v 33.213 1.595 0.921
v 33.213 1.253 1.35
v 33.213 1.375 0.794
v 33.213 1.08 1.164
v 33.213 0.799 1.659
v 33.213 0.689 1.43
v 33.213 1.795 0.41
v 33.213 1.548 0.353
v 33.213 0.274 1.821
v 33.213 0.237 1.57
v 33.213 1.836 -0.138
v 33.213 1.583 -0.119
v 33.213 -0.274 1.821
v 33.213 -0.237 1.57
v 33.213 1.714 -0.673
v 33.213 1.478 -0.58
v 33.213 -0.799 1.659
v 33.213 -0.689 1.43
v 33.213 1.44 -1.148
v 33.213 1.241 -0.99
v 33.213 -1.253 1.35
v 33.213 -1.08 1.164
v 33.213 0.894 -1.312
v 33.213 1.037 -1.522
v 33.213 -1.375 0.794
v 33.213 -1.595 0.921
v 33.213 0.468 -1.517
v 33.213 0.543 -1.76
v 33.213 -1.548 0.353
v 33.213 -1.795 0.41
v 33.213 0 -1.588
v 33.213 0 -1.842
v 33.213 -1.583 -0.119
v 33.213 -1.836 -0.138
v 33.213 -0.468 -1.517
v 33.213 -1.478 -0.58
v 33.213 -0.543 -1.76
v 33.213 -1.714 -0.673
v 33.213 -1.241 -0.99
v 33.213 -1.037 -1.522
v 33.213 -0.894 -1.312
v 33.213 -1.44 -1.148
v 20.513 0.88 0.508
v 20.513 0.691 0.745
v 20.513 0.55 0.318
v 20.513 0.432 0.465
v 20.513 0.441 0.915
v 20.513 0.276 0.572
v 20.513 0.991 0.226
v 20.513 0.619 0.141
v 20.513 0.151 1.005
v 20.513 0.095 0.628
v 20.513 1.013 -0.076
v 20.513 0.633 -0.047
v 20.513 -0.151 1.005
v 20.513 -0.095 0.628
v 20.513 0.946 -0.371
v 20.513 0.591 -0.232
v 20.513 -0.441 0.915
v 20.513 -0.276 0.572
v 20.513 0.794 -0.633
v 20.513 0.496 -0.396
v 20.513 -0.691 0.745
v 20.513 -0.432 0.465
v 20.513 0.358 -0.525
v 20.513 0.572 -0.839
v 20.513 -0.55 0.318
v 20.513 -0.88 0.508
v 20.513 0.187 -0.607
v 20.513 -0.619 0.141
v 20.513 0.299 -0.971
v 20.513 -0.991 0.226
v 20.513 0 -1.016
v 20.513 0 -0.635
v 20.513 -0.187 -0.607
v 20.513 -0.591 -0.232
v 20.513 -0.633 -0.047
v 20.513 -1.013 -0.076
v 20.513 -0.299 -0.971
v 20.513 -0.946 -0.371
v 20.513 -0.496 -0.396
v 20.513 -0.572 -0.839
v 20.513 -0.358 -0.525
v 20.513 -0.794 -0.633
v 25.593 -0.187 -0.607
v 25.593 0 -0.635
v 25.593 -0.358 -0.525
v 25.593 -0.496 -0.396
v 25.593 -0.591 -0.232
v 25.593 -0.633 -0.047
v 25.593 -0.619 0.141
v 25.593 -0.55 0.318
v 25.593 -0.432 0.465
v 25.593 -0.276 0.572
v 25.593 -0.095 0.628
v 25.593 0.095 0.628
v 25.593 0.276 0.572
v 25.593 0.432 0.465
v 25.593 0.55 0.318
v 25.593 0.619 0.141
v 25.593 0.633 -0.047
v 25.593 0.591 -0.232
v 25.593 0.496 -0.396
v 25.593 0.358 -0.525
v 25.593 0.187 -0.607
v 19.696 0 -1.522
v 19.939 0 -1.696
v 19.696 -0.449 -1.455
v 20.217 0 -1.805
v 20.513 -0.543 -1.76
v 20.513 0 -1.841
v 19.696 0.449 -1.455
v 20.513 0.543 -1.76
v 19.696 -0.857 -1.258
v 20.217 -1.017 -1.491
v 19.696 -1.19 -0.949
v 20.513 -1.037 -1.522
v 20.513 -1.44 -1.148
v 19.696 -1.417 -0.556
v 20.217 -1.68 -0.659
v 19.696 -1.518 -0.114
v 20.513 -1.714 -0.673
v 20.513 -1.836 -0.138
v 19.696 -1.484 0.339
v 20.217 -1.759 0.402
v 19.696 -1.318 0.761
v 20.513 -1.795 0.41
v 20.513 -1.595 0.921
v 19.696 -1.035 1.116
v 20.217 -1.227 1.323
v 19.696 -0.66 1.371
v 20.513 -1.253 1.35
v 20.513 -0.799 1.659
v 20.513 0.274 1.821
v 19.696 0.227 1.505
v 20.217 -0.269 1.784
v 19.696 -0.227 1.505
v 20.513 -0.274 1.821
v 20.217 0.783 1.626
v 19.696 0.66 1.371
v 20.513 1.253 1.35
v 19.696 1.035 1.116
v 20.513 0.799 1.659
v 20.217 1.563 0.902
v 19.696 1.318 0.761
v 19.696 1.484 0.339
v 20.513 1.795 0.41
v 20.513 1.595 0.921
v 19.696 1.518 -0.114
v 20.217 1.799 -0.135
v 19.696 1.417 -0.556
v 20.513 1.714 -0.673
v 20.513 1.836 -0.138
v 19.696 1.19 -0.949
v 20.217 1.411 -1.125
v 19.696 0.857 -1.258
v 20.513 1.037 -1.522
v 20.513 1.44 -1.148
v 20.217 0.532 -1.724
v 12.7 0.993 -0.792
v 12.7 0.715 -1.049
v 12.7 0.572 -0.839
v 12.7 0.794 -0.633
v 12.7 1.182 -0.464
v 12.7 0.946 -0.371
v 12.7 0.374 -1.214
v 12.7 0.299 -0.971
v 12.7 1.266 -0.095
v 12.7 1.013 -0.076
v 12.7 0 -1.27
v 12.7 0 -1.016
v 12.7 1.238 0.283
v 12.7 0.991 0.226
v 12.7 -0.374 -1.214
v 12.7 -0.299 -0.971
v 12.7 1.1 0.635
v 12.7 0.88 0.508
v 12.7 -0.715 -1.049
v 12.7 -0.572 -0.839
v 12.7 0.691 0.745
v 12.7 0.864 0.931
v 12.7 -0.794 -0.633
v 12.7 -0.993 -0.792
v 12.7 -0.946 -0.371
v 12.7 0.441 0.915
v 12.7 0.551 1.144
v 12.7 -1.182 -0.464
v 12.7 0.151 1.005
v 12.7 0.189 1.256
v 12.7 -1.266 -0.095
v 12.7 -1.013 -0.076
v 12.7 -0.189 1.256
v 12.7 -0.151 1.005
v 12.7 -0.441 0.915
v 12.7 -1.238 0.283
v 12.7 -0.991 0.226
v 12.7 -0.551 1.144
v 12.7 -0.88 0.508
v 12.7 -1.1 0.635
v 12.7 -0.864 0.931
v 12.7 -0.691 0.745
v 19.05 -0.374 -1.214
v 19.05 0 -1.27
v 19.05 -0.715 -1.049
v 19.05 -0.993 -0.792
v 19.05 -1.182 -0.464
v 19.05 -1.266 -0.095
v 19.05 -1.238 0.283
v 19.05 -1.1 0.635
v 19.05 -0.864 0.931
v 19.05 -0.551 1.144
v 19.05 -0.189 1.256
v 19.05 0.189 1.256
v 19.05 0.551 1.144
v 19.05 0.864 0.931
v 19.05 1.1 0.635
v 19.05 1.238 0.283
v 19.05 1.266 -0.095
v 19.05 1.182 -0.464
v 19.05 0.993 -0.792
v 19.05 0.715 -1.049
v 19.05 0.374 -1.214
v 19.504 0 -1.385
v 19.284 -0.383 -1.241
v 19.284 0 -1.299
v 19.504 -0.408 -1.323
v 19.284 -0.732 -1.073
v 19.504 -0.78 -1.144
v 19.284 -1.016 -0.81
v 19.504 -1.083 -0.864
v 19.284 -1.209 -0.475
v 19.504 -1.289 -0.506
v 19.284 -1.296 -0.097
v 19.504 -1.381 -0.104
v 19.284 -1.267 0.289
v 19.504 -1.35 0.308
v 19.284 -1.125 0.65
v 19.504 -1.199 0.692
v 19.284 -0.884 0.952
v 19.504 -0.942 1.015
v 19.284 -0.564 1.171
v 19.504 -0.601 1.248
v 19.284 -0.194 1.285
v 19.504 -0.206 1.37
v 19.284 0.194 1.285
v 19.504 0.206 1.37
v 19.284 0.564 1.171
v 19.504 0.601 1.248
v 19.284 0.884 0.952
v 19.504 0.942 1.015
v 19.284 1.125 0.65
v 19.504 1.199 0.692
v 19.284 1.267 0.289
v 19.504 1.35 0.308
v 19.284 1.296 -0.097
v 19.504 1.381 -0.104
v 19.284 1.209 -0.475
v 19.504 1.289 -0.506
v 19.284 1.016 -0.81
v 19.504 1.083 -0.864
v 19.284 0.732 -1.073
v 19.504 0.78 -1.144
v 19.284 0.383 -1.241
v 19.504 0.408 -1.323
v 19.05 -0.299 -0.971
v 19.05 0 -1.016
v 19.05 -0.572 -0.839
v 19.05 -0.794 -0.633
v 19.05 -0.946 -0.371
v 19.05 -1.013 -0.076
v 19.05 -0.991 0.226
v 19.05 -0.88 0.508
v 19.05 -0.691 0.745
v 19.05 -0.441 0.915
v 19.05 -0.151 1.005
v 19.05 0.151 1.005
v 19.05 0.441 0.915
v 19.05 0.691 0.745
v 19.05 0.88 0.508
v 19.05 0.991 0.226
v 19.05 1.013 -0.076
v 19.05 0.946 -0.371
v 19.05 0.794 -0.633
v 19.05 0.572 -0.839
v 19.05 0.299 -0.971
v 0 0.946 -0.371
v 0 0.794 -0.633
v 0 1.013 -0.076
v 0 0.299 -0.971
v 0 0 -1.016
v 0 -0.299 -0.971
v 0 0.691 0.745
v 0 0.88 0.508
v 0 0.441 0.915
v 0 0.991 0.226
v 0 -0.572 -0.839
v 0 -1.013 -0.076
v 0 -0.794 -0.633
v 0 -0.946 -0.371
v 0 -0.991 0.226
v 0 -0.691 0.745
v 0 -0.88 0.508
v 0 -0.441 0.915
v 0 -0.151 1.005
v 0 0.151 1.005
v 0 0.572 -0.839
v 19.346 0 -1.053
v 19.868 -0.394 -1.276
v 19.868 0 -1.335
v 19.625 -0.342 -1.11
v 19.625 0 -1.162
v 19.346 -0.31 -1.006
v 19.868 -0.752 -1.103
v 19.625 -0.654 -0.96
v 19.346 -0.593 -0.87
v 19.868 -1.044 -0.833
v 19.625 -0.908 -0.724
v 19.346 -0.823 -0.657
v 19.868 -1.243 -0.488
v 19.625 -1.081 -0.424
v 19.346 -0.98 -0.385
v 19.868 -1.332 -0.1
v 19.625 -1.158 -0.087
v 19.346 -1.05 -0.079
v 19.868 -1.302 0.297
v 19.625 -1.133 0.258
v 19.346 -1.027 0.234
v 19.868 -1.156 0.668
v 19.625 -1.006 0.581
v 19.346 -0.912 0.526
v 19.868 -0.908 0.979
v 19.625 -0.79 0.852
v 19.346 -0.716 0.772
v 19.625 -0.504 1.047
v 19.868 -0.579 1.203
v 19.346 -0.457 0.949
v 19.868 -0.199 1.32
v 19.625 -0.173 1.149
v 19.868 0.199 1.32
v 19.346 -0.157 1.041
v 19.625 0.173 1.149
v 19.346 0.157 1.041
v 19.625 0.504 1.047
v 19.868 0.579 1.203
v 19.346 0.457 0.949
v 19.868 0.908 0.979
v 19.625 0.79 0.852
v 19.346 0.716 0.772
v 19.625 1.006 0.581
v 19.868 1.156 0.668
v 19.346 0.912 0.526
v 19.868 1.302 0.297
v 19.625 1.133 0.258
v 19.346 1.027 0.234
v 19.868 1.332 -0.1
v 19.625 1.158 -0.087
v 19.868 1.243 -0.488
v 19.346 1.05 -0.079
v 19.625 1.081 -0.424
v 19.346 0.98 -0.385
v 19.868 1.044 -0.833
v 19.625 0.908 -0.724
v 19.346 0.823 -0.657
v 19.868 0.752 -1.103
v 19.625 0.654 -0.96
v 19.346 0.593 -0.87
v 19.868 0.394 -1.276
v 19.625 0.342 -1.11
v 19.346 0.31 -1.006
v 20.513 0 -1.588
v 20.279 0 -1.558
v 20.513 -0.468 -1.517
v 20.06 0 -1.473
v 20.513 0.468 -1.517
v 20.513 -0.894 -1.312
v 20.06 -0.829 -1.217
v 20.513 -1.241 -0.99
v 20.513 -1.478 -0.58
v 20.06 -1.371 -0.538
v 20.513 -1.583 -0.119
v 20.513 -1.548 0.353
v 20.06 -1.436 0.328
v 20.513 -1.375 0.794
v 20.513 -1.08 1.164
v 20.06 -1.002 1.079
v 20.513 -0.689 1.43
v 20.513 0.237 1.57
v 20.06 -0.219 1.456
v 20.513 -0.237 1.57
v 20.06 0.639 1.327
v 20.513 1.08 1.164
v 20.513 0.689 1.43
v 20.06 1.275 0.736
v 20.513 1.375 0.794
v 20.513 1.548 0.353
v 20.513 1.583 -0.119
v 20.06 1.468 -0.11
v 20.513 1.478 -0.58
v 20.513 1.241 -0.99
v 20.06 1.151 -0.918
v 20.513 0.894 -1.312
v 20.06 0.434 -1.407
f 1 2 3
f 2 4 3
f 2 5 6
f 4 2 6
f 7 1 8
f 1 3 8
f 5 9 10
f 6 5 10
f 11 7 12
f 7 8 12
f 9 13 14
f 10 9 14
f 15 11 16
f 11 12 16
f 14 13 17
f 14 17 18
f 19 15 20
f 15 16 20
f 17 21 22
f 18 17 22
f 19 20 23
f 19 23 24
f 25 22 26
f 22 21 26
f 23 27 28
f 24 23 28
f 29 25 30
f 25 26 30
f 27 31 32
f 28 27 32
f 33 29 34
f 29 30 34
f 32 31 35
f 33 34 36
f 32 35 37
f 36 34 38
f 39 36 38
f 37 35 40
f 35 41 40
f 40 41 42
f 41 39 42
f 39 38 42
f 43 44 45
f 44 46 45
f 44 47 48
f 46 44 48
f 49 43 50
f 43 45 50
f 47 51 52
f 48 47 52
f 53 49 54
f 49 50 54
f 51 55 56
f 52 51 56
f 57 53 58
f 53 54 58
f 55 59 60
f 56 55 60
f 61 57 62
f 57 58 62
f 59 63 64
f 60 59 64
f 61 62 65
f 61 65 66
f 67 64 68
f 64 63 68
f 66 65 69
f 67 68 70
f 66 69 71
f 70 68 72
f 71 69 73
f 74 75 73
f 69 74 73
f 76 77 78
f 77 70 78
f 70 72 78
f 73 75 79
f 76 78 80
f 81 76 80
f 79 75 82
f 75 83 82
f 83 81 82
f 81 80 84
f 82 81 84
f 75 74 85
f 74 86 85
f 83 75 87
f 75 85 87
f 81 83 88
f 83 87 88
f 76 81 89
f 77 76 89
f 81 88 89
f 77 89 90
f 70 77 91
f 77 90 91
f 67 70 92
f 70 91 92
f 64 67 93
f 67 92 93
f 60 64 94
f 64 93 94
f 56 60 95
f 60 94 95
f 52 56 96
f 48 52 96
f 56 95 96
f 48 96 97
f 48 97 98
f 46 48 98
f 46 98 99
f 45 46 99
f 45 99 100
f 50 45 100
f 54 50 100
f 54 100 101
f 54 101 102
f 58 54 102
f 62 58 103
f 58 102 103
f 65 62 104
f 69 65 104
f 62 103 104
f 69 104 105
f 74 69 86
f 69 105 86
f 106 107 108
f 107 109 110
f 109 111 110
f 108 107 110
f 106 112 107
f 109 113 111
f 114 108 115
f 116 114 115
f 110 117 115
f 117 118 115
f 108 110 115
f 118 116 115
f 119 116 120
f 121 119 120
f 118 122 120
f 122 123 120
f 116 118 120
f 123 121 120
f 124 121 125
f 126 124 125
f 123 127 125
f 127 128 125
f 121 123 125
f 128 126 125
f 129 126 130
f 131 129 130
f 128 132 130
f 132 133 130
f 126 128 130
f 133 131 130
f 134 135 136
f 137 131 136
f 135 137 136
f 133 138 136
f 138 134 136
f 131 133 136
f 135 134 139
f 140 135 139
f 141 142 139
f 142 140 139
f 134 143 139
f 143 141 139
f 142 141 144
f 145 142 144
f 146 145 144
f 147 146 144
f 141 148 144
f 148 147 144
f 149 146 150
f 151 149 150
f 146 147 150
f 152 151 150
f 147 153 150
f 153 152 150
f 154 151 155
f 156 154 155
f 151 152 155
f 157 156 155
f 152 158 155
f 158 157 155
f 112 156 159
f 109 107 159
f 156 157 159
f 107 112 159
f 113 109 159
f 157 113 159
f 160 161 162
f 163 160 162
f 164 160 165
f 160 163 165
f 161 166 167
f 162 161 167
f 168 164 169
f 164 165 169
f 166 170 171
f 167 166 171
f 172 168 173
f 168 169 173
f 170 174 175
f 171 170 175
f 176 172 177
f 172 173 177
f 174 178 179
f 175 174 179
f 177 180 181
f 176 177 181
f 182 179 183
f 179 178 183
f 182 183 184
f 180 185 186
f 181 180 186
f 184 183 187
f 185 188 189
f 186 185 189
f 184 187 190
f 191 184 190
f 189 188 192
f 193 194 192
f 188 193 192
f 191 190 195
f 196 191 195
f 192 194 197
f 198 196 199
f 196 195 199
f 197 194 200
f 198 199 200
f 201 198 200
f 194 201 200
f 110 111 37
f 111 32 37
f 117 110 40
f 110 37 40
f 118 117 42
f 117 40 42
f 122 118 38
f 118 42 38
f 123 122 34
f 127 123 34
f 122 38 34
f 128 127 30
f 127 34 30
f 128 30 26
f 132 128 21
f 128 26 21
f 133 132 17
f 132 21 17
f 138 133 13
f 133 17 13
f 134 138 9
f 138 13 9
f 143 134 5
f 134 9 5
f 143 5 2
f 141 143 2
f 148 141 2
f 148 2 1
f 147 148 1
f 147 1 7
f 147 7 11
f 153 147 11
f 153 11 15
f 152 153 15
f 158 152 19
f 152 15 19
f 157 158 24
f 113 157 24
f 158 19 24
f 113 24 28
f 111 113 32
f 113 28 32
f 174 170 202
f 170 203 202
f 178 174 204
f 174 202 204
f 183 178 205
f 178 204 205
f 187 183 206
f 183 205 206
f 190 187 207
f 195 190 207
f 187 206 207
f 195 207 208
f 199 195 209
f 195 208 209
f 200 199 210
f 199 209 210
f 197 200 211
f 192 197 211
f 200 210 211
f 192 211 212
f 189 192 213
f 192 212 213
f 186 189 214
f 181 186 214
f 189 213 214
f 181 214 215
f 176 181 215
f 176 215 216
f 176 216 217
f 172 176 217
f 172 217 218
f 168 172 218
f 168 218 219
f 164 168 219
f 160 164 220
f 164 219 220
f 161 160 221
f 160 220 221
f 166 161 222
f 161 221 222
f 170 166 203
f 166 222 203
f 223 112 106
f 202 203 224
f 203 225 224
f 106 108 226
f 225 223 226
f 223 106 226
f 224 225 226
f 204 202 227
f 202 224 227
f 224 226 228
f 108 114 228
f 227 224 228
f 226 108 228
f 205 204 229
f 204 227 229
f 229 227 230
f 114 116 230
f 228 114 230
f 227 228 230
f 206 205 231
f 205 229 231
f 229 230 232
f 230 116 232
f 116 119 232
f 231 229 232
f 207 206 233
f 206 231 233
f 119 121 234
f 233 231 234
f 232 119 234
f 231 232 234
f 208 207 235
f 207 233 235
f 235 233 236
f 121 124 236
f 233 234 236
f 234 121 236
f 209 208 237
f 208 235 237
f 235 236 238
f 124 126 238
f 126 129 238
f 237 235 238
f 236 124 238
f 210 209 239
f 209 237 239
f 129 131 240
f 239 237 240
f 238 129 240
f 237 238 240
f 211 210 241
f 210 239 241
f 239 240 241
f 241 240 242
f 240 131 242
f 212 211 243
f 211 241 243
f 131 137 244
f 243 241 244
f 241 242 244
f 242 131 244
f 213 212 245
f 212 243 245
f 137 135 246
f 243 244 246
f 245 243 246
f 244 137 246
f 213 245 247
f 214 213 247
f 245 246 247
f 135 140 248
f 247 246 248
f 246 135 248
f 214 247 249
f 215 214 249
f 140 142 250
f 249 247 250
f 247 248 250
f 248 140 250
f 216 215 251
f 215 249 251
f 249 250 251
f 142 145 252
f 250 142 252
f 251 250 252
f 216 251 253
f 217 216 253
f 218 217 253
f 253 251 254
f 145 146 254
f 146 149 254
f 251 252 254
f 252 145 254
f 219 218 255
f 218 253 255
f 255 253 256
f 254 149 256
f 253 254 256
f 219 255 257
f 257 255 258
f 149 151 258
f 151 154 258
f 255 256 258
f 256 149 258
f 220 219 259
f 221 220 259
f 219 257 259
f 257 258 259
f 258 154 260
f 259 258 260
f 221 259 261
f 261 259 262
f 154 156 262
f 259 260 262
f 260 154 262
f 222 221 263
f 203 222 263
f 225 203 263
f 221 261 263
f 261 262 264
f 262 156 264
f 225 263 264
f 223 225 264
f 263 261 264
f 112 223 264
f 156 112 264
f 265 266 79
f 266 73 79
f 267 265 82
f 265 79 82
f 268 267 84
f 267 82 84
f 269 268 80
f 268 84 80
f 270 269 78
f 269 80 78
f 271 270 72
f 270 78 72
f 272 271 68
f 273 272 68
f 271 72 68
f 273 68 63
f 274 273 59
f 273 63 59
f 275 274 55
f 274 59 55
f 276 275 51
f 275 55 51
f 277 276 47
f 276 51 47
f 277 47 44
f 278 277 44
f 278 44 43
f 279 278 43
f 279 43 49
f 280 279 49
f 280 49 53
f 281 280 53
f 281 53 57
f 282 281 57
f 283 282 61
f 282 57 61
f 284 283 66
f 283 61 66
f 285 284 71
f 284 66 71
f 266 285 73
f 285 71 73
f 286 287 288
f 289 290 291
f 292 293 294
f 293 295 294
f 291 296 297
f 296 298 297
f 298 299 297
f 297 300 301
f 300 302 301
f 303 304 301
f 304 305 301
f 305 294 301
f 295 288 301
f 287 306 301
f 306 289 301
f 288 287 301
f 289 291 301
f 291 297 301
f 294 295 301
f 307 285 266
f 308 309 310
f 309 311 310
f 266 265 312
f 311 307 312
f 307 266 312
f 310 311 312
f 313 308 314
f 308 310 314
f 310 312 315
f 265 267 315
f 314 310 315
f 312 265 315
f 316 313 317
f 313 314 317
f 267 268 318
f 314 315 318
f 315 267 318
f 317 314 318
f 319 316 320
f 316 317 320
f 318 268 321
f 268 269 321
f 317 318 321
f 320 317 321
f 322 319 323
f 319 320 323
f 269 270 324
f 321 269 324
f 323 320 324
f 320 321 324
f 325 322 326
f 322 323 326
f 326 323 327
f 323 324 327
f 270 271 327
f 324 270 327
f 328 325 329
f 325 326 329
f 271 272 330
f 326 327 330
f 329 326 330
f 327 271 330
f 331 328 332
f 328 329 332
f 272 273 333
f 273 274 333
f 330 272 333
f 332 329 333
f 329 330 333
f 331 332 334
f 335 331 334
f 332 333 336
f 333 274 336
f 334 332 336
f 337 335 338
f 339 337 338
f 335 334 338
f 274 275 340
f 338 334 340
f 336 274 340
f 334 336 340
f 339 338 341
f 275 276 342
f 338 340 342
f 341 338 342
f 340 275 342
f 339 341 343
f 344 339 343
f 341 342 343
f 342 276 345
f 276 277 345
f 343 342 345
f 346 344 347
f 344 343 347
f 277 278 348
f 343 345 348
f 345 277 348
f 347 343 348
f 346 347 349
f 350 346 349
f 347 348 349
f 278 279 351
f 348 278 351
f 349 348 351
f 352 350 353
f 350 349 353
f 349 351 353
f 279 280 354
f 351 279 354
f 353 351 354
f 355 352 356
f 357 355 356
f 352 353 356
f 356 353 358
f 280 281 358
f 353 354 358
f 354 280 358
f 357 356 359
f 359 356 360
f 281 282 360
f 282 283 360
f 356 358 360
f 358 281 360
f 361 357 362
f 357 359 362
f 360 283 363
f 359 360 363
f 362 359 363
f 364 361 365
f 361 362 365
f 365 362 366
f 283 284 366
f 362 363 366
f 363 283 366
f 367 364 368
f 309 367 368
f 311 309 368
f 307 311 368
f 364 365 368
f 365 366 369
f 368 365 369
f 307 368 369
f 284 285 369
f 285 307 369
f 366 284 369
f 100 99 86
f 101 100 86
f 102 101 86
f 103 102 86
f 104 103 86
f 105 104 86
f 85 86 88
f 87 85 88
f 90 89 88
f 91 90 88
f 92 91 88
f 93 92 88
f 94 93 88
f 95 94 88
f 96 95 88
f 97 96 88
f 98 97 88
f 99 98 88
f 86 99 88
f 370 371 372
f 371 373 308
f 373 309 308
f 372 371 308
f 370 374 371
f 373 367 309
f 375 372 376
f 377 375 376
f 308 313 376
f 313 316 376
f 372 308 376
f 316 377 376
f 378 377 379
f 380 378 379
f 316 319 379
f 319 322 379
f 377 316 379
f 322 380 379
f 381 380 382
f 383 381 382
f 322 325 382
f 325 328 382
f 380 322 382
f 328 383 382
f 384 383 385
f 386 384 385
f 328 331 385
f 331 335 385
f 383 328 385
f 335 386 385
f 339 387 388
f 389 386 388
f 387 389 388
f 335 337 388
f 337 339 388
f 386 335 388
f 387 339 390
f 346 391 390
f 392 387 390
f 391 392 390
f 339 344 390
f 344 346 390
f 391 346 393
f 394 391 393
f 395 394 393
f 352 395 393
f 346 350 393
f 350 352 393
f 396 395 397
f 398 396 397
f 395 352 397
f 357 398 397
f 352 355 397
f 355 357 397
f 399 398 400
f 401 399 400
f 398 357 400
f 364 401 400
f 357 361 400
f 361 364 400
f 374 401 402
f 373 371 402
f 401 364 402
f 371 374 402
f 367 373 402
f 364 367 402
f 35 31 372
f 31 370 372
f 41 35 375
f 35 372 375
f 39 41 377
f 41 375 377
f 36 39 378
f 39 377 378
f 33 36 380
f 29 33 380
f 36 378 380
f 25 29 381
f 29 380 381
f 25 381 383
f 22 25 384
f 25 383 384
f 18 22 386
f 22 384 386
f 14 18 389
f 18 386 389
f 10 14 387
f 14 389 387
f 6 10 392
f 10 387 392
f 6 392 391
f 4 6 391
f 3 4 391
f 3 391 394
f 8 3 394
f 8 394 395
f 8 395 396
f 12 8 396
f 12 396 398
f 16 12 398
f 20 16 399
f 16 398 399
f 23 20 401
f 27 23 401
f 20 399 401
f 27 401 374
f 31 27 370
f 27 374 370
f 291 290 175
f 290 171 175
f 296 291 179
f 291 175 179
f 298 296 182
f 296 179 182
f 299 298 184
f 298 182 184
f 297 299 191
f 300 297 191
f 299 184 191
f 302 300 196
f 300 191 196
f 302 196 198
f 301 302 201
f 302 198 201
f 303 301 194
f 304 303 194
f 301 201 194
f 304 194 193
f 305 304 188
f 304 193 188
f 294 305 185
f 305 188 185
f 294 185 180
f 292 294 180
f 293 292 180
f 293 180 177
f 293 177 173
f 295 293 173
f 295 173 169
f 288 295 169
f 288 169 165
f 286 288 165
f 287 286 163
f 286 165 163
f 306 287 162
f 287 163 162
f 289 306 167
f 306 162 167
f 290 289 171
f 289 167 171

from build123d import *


with BuildPart() as part:
    # Sketch1 → Revolve1 (revolve)
    with BuildSketch(Plane(origin=(0, 0, 0), x_dir=(1, 0, 0), z_dir=(0, 1, 0))):
        with BuildLine():
            Line((0, 0), (0, 1.016))
            Line((0, 1.016), (12.7, 1.016))
            Line((12.7, 1.016), (12.7, 1.27))
            Line((12.7, 1.27), (19.05, 1.27))
            ThreePointArc((19.05, 1.27), (19.396522774, 1.335269355), (19.695555117, 1.522132353))
            ThreePointArc((19.695555117, 1.522132353), (20.074329418, 1.758825483), (20.513258265, 1.8415))
            Line((20.513258265, 1.8415), (33.213258265, 1.8415))
            Line((33.213258265, 1.8415), (33.213258265, 1.5875))
            Line((33.213258265, 1.5875), (20.513258265, 1.5875))
            ThreePointArc((20.513258265, 1.5875), (20.166735491, 1.522230645), (19.867703148, 1.335367647))
            ThreePointArc((19.867703148, 1.335367647), (19.488928847, 1.098674517), (19.05, 1.016))
            Line((19.05, 1.016), (20.513258265, 1.016))
            Line((20.513258265, 1.016), (20.513258265, 0.635))
            Line((20.513258265, 0.635), (25.593258265, 0.635))
            Line((25.593258265, 0.635), (25.593258265, 0))
            Line((25.593258265, 0), (0, 0))
        make_face()
    revolve(axis=Axis((25.593258265, 0, 0), (-1, 0, 0)))


solid = part.part
